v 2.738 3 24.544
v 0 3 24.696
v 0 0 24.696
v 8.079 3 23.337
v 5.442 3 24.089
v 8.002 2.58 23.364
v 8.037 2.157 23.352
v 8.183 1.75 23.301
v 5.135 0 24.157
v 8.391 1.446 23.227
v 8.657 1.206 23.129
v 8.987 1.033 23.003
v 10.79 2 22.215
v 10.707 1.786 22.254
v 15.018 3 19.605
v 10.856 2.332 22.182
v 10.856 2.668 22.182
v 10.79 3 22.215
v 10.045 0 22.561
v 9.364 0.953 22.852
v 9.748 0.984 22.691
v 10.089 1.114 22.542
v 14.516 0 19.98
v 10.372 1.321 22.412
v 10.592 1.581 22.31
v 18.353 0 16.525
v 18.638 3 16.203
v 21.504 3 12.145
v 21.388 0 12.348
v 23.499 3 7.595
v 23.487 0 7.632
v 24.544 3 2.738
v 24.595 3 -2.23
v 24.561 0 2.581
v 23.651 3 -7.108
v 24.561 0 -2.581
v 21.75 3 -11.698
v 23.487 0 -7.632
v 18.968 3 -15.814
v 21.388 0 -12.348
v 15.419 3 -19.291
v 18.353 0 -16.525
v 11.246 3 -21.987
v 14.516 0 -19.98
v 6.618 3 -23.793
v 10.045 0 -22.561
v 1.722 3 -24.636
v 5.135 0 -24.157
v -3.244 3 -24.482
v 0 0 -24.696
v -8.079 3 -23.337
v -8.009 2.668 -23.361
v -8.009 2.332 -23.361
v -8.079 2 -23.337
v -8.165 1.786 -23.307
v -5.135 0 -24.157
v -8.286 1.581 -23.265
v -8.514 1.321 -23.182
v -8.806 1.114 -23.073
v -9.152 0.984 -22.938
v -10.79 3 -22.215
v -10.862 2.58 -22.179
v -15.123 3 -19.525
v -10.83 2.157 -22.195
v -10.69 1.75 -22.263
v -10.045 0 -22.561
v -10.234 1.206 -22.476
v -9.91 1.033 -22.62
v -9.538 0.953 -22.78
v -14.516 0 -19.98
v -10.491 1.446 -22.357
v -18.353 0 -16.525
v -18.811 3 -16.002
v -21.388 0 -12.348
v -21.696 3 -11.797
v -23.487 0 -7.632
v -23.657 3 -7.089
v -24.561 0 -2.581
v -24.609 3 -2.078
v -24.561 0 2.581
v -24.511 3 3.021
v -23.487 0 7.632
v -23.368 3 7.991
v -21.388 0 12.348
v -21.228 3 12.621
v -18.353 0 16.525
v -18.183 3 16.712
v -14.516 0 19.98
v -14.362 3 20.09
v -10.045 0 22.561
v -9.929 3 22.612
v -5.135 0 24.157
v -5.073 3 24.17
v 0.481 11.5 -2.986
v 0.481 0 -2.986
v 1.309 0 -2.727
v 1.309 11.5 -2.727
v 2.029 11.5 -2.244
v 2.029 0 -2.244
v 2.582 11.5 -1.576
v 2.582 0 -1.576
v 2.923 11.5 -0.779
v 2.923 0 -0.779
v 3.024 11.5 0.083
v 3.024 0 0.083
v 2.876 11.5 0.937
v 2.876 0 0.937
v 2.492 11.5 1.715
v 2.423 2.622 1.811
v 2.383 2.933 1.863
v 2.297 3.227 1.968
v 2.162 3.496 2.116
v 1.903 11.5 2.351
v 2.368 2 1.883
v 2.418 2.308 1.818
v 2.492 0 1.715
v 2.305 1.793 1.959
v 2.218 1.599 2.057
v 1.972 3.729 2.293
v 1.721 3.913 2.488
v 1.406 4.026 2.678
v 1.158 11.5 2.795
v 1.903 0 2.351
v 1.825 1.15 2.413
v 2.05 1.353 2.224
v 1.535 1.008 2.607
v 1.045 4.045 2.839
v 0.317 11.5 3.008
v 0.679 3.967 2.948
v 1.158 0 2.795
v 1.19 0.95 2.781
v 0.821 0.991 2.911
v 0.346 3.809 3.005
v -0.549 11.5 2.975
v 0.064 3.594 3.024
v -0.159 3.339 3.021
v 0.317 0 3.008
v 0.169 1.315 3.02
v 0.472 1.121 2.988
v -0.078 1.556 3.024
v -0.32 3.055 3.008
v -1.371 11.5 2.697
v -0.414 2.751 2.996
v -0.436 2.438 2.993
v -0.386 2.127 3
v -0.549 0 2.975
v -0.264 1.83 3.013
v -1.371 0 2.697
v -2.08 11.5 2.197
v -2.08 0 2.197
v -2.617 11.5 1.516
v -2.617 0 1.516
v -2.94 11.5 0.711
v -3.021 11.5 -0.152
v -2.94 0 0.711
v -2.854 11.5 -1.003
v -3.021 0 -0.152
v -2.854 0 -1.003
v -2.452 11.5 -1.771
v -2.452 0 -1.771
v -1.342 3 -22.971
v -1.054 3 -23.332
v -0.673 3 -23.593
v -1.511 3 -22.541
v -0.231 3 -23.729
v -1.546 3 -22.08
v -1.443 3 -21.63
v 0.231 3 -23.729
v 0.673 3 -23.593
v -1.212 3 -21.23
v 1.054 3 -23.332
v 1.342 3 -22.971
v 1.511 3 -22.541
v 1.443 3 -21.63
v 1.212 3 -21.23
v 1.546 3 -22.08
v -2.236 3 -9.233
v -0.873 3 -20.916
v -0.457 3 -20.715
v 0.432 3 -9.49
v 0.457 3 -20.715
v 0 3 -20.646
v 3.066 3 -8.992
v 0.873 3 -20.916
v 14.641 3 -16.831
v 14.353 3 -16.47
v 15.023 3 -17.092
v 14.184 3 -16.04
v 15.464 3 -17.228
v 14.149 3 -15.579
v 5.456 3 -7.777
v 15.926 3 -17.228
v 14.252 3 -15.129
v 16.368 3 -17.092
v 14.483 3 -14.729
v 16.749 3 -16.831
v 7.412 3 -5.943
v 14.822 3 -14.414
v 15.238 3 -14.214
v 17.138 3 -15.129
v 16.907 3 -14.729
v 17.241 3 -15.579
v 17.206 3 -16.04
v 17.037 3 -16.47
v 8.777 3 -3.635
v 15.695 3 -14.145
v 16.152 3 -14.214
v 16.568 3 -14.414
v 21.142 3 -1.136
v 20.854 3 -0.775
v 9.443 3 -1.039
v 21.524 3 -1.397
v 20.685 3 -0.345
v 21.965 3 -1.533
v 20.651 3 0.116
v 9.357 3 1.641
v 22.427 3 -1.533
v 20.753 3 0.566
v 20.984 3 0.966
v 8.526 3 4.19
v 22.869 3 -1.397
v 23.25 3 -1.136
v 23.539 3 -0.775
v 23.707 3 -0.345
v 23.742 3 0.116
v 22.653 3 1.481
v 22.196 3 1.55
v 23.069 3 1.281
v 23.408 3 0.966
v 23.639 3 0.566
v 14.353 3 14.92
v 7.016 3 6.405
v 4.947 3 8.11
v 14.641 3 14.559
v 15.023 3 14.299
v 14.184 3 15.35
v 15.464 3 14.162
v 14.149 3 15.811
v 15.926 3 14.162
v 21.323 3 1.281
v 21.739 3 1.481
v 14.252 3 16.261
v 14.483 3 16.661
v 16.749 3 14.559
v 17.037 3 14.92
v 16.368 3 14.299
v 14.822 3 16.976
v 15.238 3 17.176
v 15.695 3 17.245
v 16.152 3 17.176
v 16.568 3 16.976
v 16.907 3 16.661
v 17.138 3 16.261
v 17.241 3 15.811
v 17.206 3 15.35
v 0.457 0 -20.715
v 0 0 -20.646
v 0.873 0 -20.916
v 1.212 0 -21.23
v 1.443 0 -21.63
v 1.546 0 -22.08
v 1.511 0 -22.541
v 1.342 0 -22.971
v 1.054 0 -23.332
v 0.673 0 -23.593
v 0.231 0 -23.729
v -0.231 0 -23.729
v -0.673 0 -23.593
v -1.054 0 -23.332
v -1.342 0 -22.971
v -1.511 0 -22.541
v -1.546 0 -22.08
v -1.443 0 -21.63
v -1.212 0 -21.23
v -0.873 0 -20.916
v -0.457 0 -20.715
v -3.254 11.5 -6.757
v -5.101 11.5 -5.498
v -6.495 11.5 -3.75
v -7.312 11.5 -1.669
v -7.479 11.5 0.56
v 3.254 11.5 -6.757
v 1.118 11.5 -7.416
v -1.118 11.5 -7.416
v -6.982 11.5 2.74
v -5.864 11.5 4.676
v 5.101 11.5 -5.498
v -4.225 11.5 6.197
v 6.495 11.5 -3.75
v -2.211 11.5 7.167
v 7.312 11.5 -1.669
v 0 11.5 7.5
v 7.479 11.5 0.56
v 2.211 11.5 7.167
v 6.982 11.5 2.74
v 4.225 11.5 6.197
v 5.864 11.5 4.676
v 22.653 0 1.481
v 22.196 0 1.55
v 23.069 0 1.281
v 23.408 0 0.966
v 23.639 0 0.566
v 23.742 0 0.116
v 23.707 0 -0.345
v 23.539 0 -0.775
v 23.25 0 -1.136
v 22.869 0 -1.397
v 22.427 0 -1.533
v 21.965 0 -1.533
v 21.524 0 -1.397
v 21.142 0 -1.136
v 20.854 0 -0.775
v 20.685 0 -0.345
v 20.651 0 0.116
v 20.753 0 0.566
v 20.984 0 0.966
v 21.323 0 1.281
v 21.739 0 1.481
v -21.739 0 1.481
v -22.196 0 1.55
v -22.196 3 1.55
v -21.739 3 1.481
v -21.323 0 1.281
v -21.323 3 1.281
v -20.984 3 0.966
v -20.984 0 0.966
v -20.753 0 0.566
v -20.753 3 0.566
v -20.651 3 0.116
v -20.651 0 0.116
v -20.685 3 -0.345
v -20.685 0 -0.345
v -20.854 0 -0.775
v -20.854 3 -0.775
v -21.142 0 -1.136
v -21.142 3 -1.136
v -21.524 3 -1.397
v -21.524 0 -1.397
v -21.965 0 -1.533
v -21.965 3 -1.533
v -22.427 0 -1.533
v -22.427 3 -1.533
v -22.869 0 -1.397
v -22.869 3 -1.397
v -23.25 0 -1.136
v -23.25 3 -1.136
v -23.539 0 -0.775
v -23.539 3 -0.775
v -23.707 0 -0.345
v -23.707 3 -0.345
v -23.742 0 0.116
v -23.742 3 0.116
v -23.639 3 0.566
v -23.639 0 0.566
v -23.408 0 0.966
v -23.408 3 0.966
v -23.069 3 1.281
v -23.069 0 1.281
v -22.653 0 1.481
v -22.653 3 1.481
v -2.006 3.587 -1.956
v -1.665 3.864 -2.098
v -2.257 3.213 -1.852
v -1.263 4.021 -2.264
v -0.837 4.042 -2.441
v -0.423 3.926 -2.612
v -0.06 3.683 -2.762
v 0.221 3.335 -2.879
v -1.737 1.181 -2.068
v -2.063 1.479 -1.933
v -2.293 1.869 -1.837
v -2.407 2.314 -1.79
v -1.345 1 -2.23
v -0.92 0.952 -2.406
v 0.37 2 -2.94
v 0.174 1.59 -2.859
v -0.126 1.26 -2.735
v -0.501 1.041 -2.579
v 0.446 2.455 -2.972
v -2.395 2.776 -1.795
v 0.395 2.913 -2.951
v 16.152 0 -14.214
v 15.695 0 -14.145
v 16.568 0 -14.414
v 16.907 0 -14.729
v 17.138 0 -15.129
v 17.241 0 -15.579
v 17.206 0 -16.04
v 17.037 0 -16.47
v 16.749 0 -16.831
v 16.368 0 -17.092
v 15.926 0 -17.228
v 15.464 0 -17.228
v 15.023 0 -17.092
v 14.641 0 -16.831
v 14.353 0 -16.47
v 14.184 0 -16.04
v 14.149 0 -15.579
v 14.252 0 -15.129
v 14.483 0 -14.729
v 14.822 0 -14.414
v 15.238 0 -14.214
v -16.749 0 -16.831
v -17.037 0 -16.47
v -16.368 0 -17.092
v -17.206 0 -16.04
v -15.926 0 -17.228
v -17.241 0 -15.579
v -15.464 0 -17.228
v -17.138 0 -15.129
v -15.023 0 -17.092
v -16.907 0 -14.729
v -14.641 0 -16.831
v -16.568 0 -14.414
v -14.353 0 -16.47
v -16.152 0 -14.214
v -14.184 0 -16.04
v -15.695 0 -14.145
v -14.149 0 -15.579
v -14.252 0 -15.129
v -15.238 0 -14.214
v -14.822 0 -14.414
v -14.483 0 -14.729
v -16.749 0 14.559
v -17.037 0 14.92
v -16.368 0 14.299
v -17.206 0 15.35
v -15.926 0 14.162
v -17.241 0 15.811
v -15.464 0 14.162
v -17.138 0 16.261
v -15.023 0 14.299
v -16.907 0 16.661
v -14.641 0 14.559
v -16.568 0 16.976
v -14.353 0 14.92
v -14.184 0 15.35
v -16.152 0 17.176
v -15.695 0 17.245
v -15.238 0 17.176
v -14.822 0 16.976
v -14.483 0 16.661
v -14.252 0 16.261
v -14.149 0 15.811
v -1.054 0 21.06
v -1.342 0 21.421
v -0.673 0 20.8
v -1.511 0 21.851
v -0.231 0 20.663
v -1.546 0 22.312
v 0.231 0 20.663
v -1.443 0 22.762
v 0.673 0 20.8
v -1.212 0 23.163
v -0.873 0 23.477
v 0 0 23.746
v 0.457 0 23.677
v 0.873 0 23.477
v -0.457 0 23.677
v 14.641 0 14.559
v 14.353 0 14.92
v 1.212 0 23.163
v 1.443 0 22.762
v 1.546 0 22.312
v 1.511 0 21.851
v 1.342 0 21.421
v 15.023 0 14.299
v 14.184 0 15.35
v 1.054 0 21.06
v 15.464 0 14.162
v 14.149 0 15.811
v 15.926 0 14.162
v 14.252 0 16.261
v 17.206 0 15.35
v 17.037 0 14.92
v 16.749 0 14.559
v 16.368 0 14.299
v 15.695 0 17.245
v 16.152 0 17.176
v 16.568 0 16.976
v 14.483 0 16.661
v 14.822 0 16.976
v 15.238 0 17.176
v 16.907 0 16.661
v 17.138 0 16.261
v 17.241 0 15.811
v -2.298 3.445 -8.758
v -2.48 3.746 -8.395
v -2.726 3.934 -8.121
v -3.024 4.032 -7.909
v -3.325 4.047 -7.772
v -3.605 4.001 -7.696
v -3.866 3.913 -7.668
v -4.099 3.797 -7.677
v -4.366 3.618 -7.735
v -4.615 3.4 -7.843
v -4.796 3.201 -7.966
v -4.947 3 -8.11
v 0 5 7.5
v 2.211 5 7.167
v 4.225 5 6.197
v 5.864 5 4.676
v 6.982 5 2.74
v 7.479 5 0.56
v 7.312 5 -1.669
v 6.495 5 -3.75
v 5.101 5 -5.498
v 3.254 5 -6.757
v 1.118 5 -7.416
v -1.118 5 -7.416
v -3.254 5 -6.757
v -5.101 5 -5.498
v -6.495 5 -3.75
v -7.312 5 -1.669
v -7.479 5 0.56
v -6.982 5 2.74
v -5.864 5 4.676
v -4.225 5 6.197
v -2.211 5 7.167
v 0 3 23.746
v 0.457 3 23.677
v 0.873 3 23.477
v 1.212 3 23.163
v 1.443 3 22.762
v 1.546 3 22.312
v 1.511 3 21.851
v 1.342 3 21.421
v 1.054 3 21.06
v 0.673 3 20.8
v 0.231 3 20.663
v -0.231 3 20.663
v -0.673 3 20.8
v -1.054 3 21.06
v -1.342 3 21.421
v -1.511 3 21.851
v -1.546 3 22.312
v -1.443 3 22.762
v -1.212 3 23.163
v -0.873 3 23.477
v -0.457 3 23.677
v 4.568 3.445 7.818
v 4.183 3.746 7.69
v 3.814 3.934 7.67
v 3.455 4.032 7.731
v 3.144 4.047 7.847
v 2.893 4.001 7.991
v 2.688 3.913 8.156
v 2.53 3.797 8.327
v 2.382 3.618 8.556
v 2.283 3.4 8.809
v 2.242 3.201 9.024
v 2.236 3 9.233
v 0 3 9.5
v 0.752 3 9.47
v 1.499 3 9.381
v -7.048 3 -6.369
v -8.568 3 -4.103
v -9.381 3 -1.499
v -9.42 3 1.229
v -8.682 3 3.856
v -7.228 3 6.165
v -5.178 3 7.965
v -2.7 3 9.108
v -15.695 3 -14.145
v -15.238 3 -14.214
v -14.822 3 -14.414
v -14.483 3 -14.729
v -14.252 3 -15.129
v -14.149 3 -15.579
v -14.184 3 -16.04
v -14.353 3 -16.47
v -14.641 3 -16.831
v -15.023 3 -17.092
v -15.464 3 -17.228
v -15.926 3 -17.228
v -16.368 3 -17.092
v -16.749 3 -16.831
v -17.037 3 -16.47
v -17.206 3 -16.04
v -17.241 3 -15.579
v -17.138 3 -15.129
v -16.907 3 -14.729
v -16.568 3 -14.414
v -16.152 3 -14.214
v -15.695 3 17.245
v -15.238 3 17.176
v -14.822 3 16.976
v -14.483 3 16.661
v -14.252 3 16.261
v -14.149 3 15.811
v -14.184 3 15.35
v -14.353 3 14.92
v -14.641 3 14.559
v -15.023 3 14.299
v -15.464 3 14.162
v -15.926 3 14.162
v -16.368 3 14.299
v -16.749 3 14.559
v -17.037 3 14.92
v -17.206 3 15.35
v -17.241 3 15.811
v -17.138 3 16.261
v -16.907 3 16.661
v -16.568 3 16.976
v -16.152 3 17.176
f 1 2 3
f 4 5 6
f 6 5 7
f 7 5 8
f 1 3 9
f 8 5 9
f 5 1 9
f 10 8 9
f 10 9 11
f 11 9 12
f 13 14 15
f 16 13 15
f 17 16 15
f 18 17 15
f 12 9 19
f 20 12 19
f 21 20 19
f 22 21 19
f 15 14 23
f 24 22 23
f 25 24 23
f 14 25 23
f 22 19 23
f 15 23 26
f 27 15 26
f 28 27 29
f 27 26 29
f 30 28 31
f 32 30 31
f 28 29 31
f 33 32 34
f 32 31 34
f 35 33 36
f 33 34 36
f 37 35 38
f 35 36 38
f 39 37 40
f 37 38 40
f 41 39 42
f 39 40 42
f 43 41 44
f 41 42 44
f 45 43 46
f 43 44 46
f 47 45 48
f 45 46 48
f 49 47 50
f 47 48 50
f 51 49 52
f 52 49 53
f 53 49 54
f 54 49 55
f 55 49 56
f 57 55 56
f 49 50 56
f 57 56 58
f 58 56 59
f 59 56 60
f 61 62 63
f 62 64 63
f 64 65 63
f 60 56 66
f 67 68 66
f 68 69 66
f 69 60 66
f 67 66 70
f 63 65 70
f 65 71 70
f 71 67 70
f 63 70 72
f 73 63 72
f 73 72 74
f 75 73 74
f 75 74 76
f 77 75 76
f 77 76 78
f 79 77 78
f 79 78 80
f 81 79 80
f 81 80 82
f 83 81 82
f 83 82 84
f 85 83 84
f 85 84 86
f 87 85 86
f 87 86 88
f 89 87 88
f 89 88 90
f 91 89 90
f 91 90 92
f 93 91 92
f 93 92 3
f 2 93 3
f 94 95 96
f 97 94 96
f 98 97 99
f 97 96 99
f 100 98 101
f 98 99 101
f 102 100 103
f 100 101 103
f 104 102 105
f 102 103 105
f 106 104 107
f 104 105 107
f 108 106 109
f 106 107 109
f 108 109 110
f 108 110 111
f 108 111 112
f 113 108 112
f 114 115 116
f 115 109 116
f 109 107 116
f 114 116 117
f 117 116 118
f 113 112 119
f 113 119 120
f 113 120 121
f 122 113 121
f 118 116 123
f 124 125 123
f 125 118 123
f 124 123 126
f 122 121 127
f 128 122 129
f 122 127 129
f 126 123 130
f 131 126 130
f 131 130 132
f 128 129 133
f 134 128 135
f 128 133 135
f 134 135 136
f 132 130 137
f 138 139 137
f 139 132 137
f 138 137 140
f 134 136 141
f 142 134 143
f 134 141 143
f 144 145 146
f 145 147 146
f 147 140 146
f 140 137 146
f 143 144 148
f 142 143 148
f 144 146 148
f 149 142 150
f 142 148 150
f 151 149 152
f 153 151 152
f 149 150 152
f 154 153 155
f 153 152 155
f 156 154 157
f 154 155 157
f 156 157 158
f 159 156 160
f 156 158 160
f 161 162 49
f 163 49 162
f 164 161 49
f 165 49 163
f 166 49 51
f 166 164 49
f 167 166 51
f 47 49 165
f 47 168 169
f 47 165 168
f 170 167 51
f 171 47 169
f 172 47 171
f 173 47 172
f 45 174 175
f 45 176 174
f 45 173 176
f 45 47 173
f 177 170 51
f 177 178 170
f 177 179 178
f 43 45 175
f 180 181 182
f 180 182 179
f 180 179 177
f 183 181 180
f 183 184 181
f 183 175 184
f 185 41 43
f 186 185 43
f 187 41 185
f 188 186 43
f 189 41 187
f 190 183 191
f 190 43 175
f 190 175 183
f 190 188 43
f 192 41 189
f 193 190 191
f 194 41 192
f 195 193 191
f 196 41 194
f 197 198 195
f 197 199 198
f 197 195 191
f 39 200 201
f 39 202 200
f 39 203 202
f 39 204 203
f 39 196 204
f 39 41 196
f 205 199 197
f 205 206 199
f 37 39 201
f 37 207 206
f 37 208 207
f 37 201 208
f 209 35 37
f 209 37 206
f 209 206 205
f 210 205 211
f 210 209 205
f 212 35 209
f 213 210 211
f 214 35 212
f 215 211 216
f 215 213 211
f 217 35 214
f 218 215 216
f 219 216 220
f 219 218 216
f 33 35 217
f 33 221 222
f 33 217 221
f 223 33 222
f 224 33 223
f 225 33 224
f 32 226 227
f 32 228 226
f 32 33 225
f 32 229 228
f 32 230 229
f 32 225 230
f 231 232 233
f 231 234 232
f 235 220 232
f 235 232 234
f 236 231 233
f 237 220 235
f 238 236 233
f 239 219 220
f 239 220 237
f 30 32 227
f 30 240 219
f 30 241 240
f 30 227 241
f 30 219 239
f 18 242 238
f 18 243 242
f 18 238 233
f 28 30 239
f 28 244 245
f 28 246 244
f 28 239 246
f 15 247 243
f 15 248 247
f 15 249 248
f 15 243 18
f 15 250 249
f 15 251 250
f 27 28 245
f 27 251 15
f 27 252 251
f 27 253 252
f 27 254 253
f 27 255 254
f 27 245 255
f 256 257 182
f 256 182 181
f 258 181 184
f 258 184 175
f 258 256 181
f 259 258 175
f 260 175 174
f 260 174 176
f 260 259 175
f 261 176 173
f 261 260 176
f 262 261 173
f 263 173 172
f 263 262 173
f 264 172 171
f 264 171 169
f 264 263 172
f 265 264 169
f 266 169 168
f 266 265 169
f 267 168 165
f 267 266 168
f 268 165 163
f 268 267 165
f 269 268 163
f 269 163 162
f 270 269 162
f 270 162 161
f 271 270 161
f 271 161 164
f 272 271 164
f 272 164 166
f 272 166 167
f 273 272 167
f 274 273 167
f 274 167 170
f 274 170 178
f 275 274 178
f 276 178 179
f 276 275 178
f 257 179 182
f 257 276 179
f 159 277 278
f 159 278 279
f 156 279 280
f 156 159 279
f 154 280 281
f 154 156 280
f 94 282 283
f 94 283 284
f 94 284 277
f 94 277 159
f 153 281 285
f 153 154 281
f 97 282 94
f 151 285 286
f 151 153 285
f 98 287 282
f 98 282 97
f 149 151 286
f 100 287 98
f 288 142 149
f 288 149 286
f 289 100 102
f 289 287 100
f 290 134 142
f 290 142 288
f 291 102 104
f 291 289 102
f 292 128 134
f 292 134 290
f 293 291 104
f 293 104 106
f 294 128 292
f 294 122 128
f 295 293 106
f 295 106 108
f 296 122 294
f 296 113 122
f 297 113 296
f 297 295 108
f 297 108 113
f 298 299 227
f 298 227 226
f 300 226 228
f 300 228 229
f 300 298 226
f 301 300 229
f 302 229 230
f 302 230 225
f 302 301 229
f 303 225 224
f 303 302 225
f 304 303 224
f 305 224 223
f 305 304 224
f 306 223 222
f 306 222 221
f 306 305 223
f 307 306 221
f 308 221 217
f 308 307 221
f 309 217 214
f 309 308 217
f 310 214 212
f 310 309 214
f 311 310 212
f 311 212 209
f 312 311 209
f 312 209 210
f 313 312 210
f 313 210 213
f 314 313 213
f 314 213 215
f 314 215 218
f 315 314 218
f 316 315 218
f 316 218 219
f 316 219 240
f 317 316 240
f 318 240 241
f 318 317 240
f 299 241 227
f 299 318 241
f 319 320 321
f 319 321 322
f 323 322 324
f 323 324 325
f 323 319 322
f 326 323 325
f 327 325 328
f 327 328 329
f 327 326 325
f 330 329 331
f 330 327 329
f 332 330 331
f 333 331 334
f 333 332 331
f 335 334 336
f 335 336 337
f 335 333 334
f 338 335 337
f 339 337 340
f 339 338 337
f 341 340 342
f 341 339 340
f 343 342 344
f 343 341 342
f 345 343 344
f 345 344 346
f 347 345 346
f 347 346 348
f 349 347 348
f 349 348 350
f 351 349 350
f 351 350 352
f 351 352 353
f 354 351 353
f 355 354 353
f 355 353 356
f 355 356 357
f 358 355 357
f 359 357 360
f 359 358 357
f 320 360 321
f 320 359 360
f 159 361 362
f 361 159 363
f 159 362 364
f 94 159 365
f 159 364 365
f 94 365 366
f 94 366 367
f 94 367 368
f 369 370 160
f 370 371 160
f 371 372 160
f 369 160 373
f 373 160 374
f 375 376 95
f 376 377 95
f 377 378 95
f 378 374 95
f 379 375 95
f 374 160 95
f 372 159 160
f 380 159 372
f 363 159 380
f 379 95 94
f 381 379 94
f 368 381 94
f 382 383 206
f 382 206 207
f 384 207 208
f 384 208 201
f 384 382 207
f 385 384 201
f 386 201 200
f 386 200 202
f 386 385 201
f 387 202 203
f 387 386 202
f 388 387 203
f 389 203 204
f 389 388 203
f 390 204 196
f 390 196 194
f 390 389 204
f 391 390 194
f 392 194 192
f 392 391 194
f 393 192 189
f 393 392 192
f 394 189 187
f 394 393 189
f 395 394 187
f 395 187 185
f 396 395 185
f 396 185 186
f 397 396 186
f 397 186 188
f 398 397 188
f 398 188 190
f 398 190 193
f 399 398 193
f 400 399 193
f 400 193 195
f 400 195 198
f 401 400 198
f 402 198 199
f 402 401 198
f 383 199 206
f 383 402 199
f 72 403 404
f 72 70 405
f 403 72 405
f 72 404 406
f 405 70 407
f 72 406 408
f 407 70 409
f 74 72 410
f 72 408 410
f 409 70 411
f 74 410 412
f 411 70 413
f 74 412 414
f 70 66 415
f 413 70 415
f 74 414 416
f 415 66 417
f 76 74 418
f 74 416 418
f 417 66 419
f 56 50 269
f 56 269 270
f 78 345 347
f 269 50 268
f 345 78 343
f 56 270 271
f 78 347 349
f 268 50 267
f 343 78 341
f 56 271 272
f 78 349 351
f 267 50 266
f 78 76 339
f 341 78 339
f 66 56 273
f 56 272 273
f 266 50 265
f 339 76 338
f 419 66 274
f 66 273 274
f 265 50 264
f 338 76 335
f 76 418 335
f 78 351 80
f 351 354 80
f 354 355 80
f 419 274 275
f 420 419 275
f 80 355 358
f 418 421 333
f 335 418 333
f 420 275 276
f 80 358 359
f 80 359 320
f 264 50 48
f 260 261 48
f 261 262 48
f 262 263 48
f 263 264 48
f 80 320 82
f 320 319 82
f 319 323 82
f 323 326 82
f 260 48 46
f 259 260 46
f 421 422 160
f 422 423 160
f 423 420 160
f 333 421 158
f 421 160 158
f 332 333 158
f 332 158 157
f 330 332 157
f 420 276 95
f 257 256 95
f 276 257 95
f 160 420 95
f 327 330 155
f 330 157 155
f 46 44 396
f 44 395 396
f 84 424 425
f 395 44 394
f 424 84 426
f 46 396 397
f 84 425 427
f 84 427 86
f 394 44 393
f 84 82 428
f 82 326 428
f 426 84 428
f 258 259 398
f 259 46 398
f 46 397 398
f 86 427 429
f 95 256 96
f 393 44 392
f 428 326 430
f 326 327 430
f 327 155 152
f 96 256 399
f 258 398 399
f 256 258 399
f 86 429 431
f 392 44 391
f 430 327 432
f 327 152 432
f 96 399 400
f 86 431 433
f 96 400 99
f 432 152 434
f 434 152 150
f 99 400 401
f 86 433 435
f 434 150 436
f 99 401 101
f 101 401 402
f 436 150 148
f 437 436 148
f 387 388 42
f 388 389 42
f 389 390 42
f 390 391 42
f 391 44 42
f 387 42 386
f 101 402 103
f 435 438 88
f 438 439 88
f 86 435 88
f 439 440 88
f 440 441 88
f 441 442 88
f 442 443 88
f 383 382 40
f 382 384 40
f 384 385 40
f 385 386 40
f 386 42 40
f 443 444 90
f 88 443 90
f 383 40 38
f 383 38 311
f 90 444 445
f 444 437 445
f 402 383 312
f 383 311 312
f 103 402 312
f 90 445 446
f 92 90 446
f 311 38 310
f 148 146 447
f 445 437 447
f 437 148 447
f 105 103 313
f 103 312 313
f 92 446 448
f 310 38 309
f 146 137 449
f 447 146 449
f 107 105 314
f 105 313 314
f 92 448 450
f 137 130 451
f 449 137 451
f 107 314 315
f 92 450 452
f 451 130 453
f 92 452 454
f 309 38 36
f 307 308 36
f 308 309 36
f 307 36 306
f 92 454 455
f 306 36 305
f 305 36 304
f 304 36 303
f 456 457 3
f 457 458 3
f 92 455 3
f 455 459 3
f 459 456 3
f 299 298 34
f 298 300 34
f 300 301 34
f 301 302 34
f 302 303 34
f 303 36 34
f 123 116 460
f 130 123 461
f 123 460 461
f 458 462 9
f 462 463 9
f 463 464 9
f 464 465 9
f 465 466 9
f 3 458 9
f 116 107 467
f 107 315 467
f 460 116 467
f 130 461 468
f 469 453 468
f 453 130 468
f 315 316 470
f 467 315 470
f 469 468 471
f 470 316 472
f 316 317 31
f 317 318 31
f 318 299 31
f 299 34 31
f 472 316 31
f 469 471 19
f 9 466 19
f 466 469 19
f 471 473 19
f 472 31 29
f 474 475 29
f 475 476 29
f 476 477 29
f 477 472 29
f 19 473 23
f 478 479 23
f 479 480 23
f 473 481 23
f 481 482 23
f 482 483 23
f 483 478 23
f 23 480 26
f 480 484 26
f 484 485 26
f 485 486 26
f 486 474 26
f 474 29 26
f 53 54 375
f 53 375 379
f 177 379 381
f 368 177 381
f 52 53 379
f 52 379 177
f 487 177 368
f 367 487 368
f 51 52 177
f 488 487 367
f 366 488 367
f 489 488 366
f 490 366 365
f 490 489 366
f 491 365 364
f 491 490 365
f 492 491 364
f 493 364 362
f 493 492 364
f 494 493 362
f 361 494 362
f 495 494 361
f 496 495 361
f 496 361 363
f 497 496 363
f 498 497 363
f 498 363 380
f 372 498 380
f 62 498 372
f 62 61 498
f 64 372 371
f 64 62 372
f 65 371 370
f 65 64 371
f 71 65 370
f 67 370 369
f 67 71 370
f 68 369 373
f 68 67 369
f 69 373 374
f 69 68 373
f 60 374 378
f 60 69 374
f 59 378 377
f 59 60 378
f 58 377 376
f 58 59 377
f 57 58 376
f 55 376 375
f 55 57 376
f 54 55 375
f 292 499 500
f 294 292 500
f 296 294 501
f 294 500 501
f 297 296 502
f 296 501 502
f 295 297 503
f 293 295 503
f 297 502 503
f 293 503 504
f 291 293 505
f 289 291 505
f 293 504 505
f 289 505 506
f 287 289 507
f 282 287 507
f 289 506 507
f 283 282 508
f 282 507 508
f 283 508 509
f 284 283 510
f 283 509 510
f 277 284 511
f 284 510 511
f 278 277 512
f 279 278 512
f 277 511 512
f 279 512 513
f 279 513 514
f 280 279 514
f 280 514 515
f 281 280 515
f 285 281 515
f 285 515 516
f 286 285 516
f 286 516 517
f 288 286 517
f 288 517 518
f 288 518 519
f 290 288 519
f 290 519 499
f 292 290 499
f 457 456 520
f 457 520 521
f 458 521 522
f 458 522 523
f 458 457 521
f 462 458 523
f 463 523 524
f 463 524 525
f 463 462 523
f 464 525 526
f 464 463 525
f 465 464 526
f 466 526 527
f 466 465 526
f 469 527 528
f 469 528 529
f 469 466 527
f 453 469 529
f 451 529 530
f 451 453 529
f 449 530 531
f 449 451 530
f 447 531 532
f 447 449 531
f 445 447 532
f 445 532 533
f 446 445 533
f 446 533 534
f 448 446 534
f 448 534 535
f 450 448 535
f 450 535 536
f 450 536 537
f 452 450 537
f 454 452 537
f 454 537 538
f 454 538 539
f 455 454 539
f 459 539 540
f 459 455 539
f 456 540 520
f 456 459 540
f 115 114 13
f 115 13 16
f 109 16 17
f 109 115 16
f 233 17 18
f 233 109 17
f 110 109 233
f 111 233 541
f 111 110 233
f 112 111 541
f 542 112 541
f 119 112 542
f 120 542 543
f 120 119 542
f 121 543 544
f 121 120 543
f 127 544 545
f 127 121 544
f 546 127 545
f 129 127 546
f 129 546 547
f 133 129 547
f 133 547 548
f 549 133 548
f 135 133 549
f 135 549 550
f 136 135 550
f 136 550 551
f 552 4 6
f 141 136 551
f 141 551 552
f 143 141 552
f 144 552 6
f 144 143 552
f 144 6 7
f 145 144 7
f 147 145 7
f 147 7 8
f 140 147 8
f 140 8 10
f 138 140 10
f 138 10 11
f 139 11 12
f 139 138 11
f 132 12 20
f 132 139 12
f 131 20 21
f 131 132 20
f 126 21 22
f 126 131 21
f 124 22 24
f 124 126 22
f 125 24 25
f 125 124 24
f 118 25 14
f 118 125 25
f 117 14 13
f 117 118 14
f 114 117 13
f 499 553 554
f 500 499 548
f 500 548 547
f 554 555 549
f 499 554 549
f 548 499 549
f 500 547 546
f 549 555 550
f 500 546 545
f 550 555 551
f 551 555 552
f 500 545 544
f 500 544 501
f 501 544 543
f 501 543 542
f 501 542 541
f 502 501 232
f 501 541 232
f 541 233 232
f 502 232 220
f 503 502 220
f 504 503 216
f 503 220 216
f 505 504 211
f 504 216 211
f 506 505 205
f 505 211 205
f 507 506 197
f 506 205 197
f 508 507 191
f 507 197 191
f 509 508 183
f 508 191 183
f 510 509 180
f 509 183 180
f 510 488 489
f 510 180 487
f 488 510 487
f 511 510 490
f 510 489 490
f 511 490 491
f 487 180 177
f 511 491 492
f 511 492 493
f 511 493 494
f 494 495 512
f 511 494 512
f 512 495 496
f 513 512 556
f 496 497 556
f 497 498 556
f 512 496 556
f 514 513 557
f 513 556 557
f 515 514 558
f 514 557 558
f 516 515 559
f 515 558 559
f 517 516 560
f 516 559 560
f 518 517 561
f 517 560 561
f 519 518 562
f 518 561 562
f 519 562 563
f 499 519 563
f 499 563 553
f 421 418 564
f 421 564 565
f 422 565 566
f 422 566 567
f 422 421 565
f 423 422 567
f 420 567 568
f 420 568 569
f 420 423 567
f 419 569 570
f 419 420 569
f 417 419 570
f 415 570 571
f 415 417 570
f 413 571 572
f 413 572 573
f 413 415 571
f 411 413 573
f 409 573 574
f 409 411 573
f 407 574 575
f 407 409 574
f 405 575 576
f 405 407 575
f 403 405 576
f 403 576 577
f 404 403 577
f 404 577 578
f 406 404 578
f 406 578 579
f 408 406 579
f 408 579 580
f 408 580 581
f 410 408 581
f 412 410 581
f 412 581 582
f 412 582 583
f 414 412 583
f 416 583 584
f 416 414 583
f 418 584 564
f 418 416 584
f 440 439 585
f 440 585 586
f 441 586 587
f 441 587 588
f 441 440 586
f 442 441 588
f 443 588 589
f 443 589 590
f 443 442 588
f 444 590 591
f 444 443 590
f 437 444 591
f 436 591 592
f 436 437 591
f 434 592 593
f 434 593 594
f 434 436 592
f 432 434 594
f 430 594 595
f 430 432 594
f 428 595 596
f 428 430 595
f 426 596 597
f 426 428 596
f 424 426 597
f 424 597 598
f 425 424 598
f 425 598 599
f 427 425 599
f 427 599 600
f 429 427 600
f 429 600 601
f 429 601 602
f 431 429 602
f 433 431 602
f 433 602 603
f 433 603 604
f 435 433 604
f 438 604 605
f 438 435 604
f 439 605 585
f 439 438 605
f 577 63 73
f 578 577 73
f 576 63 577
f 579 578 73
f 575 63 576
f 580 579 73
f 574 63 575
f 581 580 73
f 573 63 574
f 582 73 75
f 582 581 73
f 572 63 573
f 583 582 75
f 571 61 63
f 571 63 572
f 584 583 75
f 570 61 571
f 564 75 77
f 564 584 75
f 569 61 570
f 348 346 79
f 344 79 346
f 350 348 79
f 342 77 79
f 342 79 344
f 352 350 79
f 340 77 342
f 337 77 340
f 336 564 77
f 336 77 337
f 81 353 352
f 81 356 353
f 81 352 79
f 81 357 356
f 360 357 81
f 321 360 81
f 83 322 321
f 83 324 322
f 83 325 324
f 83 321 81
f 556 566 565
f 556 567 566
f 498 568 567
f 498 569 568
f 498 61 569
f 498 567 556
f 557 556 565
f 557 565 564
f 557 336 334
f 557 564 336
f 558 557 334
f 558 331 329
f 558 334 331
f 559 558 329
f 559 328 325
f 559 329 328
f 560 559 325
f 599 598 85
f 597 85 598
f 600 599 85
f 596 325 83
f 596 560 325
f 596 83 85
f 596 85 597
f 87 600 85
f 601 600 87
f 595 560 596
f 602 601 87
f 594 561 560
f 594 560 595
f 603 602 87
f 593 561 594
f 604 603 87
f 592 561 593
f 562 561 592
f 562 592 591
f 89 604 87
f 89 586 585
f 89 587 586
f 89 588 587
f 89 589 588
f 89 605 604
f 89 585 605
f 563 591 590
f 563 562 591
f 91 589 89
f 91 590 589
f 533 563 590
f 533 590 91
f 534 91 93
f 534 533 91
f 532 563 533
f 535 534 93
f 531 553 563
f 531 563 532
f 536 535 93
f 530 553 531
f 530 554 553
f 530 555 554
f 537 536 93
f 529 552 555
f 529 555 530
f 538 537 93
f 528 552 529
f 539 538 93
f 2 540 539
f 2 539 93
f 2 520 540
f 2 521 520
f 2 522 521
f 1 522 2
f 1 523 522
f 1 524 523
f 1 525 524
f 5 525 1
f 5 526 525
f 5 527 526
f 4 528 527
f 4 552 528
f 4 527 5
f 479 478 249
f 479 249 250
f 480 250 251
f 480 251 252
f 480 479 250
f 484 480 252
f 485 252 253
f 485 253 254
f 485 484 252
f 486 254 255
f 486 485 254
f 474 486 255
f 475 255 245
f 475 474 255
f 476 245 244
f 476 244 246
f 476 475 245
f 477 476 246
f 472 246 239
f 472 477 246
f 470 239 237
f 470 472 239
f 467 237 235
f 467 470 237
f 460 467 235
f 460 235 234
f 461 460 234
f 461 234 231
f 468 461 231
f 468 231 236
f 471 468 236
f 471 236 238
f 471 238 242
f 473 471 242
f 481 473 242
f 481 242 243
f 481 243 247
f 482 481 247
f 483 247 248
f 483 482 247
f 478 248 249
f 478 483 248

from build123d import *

# Parameters (mm, degrees)
SKETCH_1_R               = 24.696170665
SKETCH_1_R_2             = 1.55
SKETCH_1_R_3             = 7.5
EXTRUDE_1_DEPTH          = 3
SKETCH_1_4_R             = 7.5
EXTRUDE_2_DEPTH          = 11.5
CHAMFER_2_SIZE           = 2
CUT_EXTRUDE_2_DEPTH      = 40.04942882
CUT_EXTRUDE_2_DEPTH_BACK = 40.04942882
SKETCH_5_R               = 1.55


with BuildPart() as part:
    # 草图1 → 凸台-拉伸1 (new body)
    with BuildSketch(Plane(origin=(0, 0, 0), x_dir=(1, 0, 0), z_dir=(0, 1, 0))):
        Circle(SKETCH_1_R)
        with Locations((-15.695062794, -15.695062794)):
            Circle(SKETCH_1_R_2, mode=Mode.SUBTRACT)
        with Locations((0, -22.196170665)):
            Circle(SKETCH_1_R_2, mode=Mode.SUBTRACT)
        with Locations((15.695062794, -15.695062794)):
            Circle(SKETCH_1_R_2, mode=Mode.SUBTRACT)
        with Locations((-22.196170665, 0)):
            Circle(SKETCH_1_R_2, mode=Mode.SUBTRACT)
        with Locations((-15.695062794, 15.695062794)):
            Circle(SKETCH_1_R_2, mode=Mode.SUBTRACT)
        Circle(SKETCH_1_R_3, mode=Mode.SUBTRACT)
        with Locations((22.196170665, 0)):
            Circle(SKETCH_1_R_2, mode=Mode.SUBTRACT)
        with Locations((0, 22.196170665)):
            Circle(SKETCH_1_R_2, mode=Mode.SUBTRACT)
        with Locations((15.695062794, 15.695062794)):
            Circle(SKETCH_1_R_2, mode=Mode.SUBTRACT)
    extrude(amount=EXTRUDE_1_DEPTH)

    # 草图1<4> → 凸台-拉伸2 (add)
    with BuildSketch(Plane(origin=(0, 0, 0), x_dir=(1, 0, 0), z_dir=(0, 1, 0))):
        Circle(SKETCH_1_4_R)
        with BuildLine():
            Line((-2.452023129, 1.77149868), (0.481203452, 2.986480912))
            ThreePointArc((0.481203452, 2.986480912), (1.157617383, -2.794735586), (-2.452023129, 1.77149868))
        make_face(mode=Mode.SUBTRACT)
    extrude(amount=EXTRUDE_2_DEPTH)

    # 倒角2
    chamfer_2_edges = [part.edges().sort_by_distance(p)[0] for p in [
        (-7.5, 3, 0),
    ]]
    chamfer(chamfer_2_edges, length=CHAMFER_2_SIZE)

    # 草图5 → 切除-拉伸2 (cut, two sides: drawn at the far end of the back side and taken through both)
    with BuildSketch(Plane(origin=(-0.985409838, 0, -2.378989796), x_dir=(0.9238795325112868, 0, -0.38268343236508967), z_dir=(0.3826834323650896, 0, 0.9238795325112867)).offset(-CUT_EXTRUDE_2_DEPTH_BACK)):
        with Locations((0, 2.5)):
            Circle(SKETCH_5_R)
    extrude(amount=CUT_EXTRUDE_2_DEPTH + CUT_EXTRUDE_2_DEPTH_BACK, mode=Mode.SUBTRACT)


solid = part.part
